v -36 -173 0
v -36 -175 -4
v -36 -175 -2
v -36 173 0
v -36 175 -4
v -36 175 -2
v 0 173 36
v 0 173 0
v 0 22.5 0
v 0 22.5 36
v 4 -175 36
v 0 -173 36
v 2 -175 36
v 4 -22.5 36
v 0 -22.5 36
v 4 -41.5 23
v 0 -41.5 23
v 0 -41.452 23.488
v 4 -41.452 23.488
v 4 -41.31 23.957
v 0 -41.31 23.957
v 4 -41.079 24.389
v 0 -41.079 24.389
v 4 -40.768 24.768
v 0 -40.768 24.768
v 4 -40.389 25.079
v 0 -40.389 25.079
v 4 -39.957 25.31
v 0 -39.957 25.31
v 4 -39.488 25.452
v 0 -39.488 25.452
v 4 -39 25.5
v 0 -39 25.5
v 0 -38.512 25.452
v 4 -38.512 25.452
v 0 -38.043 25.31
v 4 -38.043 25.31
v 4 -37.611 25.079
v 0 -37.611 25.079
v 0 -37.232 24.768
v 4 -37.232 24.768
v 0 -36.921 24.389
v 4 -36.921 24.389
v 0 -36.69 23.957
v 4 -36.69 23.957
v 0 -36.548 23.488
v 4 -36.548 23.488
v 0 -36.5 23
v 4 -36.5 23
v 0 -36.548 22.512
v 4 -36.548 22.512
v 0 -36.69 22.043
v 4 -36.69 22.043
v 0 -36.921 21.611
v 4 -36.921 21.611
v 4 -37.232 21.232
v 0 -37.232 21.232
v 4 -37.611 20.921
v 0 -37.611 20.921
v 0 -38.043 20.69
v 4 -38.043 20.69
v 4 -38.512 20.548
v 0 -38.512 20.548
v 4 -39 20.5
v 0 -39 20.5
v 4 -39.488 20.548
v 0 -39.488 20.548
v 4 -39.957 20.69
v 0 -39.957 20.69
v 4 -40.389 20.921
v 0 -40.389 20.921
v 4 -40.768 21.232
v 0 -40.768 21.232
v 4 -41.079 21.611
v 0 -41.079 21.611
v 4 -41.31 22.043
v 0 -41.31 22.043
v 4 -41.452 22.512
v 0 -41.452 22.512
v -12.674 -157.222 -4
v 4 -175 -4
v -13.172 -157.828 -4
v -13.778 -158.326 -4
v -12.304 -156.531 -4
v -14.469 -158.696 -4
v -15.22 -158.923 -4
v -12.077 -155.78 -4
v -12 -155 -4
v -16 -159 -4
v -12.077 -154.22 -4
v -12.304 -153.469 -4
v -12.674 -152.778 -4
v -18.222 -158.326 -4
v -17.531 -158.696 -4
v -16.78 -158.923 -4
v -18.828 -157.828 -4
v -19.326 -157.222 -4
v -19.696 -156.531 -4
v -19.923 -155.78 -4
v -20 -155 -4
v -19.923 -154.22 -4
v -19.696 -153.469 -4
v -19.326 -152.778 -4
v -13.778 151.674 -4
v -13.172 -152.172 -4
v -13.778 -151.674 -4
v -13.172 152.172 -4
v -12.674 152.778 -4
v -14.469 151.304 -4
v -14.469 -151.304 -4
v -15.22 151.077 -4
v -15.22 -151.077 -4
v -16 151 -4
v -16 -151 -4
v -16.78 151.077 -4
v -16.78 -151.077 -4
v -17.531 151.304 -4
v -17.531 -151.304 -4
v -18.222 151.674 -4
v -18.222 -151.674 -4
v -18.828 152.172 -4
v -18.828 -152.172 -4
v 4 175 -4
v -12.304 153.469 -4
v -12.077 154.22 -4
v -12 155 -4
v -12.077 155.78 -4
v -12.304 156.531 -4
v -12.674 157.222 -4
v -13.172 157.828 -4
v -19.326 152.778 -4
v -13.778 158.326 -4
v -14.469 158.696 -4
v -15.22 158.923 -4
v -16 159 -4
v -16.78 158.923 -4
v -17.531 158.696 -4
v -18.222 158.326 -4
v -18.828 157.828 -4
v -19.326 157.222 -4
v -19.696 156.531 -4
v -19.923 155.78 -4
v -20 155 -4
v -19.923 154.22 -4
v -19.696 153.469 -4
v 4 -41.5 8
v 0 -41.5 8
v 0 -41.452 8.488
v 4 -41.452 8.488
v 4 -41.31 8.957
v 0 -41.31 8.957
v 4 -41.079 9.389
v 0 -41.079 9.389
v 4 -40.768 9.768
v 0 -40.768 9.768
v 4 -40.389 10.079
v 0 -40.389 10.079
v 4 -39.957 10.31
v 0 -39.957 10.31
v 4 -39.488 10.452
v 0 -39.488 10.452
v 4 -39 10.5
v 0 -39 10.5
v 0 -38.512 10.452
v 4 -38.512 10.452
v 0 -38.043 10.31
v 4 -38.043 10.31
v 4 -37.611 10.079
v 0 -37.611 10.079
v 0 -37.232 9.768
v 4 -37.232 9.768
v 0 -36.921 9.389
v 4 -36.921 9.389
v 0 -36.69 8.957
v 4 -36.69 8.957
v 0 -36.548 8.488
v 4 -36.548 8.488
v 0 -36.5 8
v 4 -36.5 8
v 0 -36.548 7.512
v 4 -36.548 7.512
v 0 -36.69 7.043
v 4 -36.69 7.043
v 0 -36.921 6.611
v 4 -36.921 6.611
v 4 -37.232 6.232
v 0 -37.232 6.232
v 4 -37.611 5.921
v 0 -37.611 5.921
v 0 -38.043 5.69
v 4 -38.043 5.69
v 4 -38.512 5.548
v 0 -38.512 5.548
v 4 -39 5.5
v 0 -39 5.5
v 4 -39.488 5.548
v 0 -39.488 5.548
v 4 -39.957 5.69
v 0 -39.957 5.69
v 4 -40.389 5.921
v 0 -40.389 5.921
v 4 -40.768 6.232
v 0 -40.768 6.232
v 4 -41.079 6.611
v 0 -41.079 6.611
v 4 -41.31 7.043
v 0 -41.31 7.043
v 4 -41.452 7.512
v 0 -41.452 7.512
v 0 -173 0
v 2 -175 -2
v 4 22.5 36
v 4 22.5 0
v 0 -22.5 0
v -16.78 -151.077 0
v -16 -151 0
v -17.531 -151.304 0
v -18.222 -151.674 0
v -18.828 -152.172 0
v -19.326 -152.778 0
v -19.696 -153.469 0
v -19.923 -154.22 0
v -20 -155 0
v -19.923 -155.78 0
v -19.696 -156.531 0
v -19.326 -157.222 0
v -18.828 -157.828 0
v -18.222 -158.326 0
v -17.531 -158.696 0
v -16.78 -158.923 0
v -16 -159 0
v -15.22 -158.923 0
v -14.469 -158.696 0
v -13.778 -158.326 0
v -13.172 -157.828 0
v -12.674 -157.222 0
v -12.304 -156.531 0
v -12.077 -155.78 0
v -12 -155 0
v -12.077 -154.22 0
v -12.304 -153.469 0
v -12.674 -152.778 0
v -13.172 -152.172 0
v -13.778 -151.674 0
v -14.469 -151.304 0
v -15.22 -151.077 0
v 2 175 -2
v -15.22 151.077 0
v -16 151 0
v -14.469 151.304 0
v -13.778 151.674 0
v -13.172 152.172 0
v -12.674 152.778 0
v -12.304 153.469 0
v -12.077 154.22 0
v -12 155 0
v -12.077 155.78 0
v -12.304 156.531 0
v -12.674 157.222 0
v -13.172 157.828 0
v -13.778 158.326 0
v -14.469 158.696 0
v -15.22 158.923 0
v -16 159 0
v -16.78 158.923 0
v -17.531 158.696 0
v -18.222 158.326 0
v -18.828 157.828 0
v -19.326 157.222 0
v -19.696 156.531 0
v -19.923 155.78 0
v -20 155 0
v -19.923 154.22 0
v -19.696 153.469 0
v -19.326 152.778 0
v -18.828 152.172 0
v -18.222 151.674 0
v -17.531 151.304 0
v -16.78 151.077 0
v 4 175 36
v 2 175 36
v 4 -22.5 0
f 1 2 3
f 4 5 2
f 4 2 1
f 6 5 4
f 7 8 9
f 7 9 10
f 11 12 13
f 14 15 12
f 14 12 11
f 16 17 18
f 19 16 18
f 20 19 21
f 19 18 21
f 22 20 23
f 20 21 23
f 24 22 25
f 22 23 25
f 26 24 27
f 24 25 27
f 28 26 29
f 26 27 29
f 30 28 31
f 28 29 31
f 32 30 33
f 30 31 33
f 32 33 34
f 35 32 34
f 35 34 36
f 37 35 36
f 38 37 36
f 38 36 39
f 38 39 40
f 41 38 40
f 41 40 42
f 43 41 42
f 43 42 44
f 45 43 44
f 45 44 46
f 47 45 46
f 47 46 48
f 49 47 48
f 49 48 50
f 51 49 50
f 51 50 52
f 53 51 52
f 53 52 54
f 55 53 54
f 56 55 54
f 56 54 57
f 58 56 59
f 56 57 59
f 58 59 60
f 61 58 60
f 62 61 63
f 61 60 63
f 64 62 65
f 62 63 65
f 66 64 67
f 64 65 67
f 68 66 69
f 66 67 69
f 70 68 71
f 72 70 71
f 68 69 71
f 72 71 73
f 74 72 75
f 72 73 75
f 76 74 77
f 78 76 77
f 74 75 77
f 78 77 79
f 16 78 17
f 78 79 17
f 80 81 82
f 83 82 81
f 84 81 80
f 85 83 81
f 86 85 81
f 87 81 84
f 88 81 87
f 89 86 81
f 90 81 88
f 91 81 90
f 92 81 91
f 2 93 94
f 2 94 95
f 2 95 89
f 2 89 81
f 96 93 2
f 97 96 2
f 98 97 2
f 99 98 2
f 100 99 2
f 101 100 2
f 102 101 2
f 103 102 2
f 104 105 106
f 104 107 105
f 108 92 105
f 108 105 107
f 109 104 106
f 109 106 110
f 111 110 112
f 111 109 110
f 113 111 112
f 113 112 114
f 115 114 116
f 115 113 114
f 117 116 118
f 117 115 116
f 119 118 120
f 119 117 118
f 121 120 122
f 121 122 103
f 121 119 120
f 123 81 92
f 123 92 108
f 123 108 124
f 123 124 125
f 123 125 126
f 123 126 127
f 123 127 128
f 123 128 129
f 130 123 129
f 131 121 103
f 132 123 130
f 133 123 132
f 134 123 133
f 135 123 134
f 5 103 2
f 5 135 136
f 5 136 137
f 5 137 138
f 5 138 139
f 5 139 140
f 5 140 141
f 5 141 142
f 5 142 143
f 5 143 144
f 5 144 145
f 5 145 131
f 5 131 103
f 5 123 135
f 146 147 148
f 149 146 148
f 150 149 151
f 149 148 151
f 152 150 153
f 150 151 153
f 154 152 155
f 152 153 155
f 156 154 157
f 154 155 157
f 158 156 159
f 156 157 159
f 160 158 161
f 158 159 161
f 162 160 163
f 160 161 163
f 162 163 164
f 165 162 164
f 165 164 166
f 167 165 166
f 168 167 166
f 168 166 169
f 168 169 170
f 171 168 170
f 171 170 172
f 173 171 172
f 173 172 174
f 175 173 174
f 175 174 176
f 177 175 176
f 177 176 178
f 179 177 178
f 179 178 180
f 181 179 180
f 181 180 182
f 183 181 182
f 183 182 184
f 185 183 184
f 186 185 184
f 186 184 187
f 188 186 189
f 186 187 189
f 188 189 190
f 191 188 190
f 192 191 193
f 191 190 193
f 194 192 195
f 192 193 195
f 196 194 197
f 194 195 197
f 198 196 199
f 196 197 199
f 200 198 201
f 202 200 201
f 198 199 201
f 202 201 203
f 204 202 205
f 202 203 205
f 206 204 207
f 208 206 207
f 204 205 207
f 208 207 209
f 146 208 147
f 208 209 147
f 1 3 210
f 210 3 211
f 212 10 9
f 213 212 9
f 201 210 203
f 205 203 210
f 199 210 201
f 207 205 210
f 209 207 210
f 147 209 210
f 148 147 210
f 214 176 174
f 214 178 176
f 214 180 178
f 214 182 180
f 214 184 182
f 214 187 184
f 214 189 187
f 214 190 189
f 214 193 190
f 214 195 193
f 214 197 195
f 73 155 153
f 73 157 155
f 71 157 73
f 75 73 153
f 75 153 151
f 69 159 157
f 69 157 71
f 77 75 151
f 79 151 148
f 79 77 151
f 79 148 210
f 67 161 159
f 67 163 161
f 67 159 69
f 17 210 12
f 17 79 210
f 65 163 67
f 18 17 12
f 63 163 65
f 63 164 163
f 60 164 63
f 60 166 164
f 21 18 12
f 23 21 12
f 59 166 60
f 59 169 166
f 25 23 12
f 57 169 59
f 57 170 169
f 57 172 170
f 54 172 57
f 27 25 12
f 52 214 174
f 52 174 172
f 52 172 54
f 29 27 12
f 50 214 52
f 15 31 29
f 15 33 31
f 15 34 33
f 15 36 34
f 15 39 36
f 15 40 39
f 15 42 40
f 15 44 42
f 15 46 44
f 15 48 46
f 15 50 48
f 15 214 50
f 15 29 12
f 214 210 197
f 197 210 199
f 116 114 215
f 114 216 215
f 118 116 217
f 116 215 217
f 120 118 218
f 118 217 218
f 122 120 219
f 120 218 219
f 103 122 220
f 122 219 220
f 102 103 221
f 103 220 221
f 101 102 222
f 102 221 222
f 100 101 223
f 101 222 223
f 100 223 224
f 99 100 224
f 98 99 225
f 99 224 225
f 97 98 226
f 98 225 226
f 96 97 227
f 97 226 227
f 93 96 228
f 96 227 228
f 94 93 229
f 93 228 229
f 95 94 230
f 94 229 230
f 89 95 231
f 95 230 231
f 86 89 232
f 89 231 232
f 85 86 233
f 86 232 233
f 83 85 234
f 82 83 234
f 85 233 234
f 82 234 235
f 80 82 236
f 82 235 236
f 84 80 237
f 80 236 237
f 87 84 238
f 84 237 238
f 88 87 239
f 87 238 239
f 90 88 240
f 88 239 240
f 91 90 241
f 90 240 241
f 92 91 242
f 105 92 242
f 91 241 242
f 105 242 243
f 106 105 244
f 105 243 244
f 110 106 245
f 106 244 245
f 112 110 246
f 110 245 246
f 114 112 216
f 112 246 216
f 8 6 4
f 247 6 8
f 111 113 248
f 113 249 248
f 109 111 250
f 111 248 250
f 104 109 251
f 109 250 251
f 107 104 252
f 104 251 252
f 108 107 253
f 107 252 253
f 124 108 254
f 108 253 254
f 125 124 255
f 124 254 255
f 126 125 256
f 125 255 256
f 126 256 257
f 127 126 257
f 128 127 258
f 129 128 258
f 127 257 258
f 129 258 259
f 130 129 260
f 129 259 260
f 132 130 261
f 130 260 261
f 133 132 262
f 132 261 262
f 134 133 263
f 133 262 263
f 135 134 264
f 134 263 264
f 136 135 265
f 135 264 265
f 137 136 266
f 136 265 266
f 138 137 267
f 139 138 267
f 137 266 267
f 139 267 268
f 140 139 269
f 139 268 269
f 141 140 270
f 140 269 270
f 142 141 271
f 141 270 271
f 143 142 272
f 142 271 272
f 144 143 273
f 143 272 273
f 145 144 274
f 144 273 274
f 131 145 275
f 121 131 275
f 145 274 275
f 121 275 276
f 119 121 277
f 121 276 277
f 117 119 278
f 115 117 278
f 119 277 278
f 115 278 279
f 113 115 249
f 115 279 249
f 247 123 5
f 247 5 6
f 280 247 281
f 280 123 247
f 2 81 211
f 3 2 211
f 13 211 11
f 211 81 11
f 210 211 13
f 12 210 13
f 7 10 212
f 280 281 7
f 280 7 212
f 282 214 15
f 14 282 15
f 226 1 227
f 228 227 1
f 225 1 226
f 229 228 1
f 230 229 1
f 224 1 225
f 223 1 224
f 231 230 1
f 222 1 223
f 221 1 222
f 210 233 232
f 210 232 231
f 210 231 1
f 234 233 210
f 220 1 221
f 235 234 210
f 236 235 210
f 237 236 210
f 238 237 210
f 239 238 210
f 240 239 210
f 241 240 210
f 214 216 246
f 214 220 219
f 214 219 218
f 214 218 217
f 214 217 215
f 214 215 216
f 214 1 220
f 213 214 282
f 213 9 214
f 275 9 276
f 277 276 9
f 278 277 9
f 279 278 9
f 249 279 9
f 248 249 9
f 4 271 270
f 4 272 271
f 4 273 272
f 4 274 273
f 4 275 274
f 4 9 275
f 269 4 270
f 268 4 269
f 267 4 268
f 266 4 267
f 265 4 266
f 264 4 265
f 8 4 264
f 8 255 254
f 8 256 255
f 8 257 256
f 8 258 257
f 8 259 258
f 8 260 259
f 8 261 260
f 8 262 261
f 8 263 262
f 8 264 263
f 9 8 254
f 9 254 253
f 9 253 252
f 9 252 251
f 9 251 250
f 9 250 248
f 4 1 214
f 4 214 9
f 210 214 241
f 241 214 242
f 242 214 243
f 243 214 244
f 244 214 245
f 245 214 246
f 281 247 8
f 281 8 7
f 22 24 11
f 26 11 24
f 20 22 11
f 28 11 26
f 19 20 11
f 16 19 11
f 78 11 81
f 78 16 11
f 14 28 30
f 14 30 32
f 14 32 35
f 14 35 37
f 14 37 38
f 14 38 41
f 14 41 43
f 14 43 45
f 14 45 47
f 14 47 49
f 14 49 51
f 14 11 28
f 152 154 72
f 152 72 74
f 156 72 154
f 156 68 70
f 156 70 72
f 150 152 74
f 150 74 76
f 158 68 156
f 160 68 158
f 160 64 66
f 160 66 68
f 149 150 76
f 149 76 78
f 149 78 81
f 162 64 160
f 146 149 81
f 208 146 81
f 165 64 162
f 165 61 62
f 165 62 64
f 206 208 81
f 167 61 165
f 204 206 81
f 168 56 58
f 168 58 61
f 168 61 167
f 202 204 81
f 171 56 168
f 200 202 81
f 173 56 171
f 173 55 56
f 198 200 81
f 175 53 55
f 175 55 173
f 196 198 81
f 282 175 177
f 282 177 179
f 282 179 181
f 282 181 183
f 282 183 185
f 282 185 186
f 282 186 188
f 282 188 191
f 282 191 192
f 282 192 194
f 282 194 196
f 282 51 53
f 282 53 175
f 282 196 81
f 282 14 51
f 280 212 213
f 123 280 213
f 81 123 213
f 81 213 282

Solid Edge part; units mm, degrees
sketch "Sketch1" plane through (0, 0, 0) normal (0, -1, 0) x (1, 0, 0)
  line L0 (-36, 0) -> (0, 0)
  line L1 (0, 0) -> (0, 36)
  line L2 (0, 36) -> (4, 36)
  line L3 (4, 36) -> (4, -4)
  line L4 (4, -4) -> (-36, -4)
  line L5 (-36, -4) -> (-36, 0)
  dimension "D1" = 36
  dimension "D2" = 4
extrude "Protrusion1" add sketch "Sketch1" along normal mid plane 350
sketch "Sketch2" plane through (-18, 0, 0) normal (0, 0, 1) x (0, -1, 0)
  circle A0 centre (-155, 2) radius 4
  dimension "D1" = 20
  dimension "D2" = 20
  dimension "D3" = 8
extrude "Cutout1" cut sketch "Sketch2" against normal through all
mirror "Mirror1" about plane through (0, 0, 0) normal (0, -1, 0) of "Cutout1"
sketch "Sketch3" plane through (0, 0, 18) normal (-1, 0, 0) x (0, -1, 0)
  line L0 (-22.5, -18) -> (22.5, -18)
  line L1 (22.5, -18) -> (22.5, 18)
  line L2 (22.5, 18) -> (-22.5, 18)
  line L3 (-22.5, 18) -> (-22.5, -18)
  dimension "D1" = 45
extrude "Cutout2" cut sketch "Sketch3" against normal through all
chamfer "Chamfer1" distance 2 angle 45 2 edges at (-18, -175, 0) (-18, 175, 0)
chamfer "Fase_2" distance 2 angle 45 2 edges at (0, -175, 17) (0, 175, 17)
sketch "Sketch4" plane through (0, -97.75, 18) normal (-1, 0, 0) x (0, -1, 0)
  circle A0 centre (-58.75, 5) radius 2.5
  circle A1 centre (-58.75, -10) radius 2.5
  dimension "D1" = 15
  dimension "D2" = 5
  dimension "D3" = 16.5
  dimension "D4" = 8
extrude "Cutout3" cut sketch "Sketch4" against normal through all
properties material "Aluminium, 7075-T6"
